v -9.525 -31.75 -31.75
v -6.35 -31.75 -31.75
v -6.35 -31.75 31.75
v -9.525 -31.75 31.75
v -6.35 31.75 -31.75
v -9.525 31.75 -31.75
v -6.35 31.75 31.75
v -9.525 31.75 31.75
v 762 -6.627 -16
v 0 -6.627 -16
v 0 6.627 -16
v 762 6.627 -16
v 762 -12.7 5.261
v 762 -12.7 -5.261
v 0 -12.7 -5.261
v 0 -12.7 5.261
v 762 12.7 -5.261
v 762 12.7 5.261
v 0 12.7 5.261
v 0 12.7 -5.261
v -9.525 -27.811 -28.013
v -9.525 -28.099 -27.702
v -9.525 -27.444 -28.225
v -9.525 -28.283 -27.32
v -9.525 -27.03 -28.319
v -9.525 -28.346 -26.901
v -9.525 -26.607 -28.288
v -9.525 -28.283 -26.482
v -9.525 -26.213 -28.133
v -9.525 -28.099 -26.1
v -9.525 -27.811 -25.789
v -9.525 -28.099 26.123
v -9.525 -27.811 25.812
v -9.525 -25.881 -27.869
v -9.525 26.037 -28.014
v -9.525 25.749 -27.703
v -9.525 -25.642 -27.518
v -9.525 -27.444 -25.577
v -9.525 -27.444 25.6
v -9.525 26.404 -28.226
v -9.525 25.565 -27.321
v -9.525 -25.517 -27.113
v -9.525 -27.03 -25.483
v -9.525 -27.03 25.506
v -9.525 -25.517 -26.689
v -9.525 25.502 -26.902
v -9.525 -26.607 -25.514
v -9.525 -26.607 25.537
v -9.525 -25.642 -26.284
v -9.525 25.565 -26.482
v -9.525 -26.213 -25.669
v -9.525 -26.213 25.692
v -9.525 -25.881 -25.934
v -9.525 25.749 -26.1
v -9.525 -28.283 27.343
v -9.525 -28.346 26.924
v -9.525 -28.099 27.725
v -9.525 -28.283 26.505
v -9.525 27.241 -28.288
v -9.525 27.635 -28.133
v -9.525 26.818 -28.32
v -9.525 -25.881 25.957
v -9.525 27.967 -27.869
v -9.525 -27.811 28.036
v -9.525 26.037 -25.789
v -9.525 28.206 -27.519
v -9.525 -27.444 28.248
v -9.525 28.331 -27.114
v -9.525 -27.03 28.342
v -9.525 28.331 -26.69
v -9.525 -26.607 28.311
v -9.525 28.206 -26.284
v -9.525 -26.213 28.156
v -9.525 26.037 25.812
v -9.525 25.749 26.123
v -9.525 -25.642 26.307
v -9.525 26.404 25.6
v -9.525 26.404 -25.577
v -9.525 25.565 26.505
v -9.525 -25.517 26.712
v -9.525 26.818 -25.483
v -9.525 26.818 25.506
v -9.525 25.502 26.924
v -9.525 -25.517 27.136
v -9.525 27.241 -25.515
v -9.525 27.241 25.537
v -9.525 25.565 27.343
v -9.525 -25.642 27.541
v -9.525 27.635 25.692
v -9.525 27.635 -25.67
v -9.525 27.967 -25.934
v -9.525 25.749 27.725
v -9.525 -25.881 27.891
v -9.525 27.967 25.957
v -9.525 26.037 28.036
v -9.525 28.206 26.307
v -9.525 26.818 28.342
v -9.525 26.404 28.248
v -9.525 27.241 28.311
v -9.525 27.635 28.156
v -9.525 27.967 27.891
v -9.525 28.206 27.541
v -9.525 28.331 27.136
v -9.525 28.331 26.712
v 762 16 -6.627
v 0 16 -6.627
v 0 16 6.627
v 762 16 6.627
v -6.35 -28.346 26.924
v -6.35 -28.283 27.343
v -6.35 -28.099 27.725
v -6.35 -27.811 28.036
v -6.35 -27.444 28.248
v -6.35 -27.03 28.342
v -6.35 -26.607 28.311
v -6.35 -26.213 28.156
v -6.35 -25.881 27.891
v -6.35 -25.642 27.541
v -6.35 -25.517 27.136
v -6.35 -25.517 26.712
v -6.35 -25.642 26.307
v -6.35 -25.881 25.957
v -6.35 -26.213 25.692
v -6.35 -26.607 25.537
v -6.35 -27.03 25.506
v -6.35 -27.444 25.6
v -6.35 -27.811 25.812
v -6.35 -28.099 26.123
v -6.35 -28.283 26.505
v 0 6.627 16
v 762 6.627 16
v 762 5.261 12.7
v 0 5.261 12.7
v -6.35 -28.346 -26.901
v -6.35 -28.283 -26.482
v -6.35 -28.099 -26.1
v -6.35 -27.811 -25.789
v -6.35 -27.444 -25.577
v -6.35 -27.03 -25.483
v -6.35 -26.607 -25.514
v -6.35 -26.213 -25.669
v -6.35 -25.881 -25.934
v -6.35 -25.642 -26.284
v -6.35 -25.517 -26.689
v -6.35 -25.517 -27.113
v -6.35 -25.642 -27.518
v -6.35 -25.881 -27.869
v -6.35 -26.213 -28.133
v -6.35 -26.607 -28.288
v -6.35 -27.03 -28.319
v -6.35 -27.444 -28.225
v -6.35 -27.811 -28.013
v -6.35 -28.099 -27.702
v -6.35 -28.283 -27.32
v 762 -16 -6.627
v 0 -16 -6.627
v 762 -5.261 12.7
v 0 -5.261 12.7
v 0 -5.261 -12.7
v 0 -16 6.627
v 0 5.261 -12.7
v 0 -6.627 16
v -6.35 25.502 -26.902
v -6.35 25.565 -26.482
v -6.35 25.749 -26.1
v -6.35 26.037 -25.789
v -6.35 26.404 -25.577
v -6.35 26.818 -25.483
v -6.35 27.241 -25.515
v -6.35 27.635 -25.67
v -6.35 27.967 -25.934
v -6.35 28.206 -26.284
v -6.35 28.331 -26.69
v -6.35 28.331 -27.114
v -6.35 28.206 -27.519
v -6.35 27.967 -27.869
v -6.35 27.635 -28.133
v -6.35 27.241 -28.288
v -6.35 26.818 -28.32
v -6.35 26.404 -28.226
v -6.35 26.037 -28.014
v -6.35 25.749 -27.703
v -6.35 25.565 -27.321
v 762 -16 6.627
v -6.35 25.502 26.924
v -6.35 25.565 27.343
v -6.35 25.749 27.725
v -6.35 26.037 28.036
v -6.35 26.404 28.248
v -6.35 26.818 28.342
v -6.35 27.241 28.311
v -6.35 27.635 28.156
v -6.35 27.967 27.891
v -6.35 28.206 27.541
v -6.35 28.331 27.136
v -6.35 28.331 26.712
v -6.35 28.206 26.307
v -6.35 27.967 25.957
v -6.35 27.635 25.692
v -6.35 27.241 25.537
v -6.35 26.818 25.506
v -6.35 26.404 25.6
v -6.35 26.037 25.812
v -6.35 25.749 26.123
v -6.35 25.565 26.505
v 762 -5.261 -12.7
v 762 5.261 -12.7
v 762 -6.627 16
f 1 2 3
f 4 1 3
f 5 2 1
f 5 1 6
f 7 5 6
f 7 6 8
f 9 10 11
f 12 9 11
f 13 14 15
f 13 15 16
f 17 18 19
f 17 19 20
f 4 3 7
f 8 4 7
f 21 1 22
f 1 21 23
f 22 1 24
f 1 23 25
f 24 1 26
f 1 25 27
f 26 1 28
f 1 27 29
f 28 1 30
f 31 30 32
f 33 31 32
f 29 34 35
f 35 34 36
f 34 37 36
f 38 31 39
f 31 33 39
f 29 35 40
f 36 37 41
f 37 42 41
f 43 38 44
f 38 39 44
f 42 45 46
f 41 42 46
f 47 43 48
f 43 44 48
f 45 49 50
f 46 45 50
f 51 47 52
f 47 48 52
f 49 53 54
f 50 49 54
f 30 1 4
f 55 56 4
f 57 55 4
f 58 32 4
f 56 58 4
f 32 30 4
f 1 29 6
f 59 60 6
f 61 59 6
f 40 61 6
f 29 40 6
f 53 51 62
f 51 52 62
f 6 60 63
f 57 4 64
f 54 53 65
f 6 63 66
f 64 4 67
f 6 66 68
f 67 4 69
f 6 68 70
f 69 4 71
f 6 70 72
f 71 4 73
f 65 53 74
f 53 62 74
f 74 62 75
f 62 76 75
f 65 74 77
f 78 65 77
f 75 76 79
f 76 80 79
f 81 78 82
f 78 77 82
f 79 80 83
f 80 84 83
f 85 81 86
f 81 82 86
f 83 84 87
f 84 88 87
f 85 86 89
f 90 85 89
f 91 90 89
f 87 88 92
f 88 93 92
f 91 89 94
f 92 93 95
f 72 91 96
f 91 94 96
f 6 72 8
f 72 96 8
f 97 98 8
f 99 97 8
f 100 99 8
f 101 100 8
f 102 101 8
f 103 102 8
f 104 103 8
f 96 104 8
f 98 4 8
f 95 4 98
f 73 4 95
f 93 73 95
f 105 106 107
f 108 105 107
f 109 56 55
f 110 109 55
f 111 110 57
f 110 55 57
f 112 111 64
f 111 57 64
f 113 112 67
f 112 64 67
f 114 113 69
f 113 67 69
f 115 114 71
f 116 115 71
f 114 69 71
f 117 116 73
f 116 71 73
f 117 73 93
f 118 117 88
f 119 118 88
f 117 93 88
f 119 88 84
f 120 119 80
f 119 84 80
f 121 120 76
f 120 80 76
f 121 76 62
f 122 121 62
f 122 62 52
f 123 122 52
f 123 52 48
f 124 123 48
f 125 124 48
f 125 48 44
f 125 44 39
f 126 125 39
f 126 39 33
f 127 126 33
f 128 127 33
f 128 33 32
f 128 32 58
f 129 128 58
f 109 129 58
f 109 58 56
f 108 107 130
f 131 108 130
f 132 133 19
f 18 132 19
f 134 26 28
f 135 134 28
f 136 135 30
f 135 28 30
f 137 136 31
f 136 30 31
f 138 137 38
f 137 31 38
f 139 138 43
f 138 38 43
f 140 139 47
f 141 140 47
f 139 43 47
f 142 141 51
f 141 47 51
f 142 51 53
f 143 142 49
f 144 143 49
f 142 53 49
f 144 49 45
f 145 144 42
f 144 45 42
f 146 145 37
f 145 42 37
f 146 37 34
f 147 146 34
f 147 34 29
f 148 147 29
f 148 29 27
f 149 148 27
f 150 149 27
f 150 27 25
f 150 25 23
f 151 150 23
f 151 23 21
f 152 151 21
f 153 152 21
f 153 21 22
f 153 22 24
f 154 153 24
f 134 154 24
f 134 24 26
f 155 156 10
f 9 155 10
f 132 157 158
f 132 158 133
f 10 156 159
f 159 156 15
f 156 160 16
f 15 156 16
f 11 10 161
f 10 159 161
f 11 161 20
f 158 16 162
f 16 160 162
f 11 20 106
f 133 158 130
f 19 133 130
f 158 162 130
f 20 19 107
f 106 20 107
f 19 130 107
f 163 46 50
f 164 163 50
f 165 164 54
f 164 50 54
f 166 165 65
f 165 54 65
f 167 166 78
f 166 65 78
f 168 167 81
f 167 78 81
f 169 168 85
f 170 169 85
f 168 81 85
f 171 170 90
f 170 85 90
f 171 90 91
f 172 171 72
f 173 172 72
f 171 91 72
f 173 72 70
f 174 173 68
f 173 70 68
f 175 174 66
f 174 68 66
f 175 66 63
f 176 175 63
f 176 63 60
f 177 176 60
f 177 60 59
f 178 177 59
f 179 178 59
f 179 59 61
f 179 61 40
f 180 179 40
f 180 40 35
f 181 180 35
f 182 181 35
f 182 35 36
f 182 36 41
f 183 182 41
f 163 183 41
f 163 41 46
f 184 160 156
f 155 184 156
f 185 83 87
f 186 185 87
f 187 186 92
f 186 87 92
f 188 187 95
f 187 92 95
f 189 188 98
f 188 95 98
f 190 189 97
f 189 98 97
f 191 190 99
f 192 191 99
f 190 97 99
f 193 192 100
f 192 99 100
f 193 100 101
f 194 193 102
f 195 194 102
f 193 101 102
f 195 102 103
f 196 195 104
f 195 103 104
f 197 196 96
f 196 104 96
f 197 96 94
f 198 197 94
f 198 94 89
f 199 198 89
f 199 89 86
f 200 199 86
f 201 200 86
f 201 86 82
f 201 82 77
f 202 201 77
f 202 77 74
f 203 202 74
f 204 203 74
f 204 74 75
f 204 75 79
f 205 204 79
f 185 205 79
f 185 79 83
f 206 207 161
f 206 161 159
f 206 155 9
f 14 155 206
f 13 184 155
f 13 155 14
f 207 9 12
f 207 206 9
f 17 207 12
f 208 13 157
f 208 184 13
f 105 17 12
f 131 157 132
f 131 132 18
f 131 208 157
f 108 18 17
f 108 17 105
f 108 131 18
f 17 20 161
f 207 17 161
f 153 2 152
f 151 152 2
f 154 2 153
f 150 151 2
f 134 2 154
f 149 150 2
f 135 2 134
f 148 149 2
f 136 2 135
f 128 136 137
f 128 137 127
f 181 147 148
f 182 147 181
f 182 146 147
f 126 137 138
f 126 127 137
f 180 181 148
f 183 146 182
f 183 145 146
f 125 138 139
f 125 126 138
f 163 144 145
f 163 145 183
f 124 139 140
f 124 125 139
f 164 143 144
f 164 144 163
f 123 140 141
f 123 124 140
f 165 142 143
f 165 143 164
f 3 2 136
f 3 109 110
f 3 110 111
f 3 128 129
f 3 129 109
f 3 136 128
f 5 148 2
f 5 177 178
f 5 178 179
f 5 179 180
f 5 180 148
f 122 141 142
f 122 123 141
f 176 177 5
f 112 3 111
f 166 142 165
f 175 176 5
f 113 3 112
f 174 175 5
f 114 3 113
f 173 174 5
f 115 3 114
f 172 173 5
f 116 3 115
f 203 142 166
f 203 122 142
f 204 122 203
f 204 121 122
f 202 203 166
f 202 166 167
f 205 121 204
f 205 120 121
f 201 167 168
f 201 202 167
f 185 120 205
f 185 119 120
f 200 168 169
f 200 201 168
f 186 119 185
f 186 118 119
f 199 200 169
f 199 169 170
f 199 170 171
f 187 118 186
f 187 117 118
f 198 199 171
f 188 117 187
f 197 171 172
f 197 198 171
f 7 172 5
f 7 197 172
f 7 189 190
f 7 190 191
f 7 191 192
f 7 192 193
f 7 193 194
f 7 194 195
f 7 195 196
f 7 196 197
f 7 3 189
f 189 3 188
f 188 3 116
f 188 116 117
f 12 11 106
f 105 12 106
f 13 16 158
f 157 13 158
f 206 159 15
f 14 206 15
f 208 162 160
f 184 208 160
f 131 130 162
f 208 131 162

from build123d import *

# Parameters (mm, degrees)
F1_DEPTH = 762
F7_W     = 63.5
F7_H     = 63.5
F8_DEPTH = 3.175
F10_D    = 2.8448


# Not quite as in the source:
# - the program builds the solid bodies; features that only make, move or delete a surface that nothing else refers to are left out


with BuildPart() as f1:
    # F0 (on Right) → F1 (new body)
    with BuildSketch(Plane.YZ):
        Polygon((6.627416998, 16), (-6.627416998, 16), (-16, 6.627416998), (-16, -6.627416998), (-6.627416998, -16), (6.627416998, -16), (16, -6.627416998), (16, 6.627416998), align=None)
        Polygon((-12.7, 5.2605122421), (-5.2605122421, 12.7), (5.2605122421, 12.7), (12.7, 5.2605122421), (12.7, -5.2605122421), (5.2605122421, -12.7), (-5.2605122421, -12.7), (-12.7, -5.2605122421), align=None, mode=Mode.SUBTRACT)
    extrude(amount=F1_DEPTH)


with BuildPart() as f8:
    # F7 (on offset) → F8 (new body)
    with BuildSketch(Plane.YZ.offset(-6.35)):
        Rectangle(F7_W, F7_H)
    extrude(amount=-F8_DEPTH)

    # F10 (through all)
    with Locations(Plane.YZ.offset(-6.35)):
        with Locations((-26.924, 26.924), (26.924, 26.924), (26.924, -26.9015428433), (-26.924, -26.9010574487)):
            Hole(F10_D / 2)


solid = Compound([f1.part, f8.part])
